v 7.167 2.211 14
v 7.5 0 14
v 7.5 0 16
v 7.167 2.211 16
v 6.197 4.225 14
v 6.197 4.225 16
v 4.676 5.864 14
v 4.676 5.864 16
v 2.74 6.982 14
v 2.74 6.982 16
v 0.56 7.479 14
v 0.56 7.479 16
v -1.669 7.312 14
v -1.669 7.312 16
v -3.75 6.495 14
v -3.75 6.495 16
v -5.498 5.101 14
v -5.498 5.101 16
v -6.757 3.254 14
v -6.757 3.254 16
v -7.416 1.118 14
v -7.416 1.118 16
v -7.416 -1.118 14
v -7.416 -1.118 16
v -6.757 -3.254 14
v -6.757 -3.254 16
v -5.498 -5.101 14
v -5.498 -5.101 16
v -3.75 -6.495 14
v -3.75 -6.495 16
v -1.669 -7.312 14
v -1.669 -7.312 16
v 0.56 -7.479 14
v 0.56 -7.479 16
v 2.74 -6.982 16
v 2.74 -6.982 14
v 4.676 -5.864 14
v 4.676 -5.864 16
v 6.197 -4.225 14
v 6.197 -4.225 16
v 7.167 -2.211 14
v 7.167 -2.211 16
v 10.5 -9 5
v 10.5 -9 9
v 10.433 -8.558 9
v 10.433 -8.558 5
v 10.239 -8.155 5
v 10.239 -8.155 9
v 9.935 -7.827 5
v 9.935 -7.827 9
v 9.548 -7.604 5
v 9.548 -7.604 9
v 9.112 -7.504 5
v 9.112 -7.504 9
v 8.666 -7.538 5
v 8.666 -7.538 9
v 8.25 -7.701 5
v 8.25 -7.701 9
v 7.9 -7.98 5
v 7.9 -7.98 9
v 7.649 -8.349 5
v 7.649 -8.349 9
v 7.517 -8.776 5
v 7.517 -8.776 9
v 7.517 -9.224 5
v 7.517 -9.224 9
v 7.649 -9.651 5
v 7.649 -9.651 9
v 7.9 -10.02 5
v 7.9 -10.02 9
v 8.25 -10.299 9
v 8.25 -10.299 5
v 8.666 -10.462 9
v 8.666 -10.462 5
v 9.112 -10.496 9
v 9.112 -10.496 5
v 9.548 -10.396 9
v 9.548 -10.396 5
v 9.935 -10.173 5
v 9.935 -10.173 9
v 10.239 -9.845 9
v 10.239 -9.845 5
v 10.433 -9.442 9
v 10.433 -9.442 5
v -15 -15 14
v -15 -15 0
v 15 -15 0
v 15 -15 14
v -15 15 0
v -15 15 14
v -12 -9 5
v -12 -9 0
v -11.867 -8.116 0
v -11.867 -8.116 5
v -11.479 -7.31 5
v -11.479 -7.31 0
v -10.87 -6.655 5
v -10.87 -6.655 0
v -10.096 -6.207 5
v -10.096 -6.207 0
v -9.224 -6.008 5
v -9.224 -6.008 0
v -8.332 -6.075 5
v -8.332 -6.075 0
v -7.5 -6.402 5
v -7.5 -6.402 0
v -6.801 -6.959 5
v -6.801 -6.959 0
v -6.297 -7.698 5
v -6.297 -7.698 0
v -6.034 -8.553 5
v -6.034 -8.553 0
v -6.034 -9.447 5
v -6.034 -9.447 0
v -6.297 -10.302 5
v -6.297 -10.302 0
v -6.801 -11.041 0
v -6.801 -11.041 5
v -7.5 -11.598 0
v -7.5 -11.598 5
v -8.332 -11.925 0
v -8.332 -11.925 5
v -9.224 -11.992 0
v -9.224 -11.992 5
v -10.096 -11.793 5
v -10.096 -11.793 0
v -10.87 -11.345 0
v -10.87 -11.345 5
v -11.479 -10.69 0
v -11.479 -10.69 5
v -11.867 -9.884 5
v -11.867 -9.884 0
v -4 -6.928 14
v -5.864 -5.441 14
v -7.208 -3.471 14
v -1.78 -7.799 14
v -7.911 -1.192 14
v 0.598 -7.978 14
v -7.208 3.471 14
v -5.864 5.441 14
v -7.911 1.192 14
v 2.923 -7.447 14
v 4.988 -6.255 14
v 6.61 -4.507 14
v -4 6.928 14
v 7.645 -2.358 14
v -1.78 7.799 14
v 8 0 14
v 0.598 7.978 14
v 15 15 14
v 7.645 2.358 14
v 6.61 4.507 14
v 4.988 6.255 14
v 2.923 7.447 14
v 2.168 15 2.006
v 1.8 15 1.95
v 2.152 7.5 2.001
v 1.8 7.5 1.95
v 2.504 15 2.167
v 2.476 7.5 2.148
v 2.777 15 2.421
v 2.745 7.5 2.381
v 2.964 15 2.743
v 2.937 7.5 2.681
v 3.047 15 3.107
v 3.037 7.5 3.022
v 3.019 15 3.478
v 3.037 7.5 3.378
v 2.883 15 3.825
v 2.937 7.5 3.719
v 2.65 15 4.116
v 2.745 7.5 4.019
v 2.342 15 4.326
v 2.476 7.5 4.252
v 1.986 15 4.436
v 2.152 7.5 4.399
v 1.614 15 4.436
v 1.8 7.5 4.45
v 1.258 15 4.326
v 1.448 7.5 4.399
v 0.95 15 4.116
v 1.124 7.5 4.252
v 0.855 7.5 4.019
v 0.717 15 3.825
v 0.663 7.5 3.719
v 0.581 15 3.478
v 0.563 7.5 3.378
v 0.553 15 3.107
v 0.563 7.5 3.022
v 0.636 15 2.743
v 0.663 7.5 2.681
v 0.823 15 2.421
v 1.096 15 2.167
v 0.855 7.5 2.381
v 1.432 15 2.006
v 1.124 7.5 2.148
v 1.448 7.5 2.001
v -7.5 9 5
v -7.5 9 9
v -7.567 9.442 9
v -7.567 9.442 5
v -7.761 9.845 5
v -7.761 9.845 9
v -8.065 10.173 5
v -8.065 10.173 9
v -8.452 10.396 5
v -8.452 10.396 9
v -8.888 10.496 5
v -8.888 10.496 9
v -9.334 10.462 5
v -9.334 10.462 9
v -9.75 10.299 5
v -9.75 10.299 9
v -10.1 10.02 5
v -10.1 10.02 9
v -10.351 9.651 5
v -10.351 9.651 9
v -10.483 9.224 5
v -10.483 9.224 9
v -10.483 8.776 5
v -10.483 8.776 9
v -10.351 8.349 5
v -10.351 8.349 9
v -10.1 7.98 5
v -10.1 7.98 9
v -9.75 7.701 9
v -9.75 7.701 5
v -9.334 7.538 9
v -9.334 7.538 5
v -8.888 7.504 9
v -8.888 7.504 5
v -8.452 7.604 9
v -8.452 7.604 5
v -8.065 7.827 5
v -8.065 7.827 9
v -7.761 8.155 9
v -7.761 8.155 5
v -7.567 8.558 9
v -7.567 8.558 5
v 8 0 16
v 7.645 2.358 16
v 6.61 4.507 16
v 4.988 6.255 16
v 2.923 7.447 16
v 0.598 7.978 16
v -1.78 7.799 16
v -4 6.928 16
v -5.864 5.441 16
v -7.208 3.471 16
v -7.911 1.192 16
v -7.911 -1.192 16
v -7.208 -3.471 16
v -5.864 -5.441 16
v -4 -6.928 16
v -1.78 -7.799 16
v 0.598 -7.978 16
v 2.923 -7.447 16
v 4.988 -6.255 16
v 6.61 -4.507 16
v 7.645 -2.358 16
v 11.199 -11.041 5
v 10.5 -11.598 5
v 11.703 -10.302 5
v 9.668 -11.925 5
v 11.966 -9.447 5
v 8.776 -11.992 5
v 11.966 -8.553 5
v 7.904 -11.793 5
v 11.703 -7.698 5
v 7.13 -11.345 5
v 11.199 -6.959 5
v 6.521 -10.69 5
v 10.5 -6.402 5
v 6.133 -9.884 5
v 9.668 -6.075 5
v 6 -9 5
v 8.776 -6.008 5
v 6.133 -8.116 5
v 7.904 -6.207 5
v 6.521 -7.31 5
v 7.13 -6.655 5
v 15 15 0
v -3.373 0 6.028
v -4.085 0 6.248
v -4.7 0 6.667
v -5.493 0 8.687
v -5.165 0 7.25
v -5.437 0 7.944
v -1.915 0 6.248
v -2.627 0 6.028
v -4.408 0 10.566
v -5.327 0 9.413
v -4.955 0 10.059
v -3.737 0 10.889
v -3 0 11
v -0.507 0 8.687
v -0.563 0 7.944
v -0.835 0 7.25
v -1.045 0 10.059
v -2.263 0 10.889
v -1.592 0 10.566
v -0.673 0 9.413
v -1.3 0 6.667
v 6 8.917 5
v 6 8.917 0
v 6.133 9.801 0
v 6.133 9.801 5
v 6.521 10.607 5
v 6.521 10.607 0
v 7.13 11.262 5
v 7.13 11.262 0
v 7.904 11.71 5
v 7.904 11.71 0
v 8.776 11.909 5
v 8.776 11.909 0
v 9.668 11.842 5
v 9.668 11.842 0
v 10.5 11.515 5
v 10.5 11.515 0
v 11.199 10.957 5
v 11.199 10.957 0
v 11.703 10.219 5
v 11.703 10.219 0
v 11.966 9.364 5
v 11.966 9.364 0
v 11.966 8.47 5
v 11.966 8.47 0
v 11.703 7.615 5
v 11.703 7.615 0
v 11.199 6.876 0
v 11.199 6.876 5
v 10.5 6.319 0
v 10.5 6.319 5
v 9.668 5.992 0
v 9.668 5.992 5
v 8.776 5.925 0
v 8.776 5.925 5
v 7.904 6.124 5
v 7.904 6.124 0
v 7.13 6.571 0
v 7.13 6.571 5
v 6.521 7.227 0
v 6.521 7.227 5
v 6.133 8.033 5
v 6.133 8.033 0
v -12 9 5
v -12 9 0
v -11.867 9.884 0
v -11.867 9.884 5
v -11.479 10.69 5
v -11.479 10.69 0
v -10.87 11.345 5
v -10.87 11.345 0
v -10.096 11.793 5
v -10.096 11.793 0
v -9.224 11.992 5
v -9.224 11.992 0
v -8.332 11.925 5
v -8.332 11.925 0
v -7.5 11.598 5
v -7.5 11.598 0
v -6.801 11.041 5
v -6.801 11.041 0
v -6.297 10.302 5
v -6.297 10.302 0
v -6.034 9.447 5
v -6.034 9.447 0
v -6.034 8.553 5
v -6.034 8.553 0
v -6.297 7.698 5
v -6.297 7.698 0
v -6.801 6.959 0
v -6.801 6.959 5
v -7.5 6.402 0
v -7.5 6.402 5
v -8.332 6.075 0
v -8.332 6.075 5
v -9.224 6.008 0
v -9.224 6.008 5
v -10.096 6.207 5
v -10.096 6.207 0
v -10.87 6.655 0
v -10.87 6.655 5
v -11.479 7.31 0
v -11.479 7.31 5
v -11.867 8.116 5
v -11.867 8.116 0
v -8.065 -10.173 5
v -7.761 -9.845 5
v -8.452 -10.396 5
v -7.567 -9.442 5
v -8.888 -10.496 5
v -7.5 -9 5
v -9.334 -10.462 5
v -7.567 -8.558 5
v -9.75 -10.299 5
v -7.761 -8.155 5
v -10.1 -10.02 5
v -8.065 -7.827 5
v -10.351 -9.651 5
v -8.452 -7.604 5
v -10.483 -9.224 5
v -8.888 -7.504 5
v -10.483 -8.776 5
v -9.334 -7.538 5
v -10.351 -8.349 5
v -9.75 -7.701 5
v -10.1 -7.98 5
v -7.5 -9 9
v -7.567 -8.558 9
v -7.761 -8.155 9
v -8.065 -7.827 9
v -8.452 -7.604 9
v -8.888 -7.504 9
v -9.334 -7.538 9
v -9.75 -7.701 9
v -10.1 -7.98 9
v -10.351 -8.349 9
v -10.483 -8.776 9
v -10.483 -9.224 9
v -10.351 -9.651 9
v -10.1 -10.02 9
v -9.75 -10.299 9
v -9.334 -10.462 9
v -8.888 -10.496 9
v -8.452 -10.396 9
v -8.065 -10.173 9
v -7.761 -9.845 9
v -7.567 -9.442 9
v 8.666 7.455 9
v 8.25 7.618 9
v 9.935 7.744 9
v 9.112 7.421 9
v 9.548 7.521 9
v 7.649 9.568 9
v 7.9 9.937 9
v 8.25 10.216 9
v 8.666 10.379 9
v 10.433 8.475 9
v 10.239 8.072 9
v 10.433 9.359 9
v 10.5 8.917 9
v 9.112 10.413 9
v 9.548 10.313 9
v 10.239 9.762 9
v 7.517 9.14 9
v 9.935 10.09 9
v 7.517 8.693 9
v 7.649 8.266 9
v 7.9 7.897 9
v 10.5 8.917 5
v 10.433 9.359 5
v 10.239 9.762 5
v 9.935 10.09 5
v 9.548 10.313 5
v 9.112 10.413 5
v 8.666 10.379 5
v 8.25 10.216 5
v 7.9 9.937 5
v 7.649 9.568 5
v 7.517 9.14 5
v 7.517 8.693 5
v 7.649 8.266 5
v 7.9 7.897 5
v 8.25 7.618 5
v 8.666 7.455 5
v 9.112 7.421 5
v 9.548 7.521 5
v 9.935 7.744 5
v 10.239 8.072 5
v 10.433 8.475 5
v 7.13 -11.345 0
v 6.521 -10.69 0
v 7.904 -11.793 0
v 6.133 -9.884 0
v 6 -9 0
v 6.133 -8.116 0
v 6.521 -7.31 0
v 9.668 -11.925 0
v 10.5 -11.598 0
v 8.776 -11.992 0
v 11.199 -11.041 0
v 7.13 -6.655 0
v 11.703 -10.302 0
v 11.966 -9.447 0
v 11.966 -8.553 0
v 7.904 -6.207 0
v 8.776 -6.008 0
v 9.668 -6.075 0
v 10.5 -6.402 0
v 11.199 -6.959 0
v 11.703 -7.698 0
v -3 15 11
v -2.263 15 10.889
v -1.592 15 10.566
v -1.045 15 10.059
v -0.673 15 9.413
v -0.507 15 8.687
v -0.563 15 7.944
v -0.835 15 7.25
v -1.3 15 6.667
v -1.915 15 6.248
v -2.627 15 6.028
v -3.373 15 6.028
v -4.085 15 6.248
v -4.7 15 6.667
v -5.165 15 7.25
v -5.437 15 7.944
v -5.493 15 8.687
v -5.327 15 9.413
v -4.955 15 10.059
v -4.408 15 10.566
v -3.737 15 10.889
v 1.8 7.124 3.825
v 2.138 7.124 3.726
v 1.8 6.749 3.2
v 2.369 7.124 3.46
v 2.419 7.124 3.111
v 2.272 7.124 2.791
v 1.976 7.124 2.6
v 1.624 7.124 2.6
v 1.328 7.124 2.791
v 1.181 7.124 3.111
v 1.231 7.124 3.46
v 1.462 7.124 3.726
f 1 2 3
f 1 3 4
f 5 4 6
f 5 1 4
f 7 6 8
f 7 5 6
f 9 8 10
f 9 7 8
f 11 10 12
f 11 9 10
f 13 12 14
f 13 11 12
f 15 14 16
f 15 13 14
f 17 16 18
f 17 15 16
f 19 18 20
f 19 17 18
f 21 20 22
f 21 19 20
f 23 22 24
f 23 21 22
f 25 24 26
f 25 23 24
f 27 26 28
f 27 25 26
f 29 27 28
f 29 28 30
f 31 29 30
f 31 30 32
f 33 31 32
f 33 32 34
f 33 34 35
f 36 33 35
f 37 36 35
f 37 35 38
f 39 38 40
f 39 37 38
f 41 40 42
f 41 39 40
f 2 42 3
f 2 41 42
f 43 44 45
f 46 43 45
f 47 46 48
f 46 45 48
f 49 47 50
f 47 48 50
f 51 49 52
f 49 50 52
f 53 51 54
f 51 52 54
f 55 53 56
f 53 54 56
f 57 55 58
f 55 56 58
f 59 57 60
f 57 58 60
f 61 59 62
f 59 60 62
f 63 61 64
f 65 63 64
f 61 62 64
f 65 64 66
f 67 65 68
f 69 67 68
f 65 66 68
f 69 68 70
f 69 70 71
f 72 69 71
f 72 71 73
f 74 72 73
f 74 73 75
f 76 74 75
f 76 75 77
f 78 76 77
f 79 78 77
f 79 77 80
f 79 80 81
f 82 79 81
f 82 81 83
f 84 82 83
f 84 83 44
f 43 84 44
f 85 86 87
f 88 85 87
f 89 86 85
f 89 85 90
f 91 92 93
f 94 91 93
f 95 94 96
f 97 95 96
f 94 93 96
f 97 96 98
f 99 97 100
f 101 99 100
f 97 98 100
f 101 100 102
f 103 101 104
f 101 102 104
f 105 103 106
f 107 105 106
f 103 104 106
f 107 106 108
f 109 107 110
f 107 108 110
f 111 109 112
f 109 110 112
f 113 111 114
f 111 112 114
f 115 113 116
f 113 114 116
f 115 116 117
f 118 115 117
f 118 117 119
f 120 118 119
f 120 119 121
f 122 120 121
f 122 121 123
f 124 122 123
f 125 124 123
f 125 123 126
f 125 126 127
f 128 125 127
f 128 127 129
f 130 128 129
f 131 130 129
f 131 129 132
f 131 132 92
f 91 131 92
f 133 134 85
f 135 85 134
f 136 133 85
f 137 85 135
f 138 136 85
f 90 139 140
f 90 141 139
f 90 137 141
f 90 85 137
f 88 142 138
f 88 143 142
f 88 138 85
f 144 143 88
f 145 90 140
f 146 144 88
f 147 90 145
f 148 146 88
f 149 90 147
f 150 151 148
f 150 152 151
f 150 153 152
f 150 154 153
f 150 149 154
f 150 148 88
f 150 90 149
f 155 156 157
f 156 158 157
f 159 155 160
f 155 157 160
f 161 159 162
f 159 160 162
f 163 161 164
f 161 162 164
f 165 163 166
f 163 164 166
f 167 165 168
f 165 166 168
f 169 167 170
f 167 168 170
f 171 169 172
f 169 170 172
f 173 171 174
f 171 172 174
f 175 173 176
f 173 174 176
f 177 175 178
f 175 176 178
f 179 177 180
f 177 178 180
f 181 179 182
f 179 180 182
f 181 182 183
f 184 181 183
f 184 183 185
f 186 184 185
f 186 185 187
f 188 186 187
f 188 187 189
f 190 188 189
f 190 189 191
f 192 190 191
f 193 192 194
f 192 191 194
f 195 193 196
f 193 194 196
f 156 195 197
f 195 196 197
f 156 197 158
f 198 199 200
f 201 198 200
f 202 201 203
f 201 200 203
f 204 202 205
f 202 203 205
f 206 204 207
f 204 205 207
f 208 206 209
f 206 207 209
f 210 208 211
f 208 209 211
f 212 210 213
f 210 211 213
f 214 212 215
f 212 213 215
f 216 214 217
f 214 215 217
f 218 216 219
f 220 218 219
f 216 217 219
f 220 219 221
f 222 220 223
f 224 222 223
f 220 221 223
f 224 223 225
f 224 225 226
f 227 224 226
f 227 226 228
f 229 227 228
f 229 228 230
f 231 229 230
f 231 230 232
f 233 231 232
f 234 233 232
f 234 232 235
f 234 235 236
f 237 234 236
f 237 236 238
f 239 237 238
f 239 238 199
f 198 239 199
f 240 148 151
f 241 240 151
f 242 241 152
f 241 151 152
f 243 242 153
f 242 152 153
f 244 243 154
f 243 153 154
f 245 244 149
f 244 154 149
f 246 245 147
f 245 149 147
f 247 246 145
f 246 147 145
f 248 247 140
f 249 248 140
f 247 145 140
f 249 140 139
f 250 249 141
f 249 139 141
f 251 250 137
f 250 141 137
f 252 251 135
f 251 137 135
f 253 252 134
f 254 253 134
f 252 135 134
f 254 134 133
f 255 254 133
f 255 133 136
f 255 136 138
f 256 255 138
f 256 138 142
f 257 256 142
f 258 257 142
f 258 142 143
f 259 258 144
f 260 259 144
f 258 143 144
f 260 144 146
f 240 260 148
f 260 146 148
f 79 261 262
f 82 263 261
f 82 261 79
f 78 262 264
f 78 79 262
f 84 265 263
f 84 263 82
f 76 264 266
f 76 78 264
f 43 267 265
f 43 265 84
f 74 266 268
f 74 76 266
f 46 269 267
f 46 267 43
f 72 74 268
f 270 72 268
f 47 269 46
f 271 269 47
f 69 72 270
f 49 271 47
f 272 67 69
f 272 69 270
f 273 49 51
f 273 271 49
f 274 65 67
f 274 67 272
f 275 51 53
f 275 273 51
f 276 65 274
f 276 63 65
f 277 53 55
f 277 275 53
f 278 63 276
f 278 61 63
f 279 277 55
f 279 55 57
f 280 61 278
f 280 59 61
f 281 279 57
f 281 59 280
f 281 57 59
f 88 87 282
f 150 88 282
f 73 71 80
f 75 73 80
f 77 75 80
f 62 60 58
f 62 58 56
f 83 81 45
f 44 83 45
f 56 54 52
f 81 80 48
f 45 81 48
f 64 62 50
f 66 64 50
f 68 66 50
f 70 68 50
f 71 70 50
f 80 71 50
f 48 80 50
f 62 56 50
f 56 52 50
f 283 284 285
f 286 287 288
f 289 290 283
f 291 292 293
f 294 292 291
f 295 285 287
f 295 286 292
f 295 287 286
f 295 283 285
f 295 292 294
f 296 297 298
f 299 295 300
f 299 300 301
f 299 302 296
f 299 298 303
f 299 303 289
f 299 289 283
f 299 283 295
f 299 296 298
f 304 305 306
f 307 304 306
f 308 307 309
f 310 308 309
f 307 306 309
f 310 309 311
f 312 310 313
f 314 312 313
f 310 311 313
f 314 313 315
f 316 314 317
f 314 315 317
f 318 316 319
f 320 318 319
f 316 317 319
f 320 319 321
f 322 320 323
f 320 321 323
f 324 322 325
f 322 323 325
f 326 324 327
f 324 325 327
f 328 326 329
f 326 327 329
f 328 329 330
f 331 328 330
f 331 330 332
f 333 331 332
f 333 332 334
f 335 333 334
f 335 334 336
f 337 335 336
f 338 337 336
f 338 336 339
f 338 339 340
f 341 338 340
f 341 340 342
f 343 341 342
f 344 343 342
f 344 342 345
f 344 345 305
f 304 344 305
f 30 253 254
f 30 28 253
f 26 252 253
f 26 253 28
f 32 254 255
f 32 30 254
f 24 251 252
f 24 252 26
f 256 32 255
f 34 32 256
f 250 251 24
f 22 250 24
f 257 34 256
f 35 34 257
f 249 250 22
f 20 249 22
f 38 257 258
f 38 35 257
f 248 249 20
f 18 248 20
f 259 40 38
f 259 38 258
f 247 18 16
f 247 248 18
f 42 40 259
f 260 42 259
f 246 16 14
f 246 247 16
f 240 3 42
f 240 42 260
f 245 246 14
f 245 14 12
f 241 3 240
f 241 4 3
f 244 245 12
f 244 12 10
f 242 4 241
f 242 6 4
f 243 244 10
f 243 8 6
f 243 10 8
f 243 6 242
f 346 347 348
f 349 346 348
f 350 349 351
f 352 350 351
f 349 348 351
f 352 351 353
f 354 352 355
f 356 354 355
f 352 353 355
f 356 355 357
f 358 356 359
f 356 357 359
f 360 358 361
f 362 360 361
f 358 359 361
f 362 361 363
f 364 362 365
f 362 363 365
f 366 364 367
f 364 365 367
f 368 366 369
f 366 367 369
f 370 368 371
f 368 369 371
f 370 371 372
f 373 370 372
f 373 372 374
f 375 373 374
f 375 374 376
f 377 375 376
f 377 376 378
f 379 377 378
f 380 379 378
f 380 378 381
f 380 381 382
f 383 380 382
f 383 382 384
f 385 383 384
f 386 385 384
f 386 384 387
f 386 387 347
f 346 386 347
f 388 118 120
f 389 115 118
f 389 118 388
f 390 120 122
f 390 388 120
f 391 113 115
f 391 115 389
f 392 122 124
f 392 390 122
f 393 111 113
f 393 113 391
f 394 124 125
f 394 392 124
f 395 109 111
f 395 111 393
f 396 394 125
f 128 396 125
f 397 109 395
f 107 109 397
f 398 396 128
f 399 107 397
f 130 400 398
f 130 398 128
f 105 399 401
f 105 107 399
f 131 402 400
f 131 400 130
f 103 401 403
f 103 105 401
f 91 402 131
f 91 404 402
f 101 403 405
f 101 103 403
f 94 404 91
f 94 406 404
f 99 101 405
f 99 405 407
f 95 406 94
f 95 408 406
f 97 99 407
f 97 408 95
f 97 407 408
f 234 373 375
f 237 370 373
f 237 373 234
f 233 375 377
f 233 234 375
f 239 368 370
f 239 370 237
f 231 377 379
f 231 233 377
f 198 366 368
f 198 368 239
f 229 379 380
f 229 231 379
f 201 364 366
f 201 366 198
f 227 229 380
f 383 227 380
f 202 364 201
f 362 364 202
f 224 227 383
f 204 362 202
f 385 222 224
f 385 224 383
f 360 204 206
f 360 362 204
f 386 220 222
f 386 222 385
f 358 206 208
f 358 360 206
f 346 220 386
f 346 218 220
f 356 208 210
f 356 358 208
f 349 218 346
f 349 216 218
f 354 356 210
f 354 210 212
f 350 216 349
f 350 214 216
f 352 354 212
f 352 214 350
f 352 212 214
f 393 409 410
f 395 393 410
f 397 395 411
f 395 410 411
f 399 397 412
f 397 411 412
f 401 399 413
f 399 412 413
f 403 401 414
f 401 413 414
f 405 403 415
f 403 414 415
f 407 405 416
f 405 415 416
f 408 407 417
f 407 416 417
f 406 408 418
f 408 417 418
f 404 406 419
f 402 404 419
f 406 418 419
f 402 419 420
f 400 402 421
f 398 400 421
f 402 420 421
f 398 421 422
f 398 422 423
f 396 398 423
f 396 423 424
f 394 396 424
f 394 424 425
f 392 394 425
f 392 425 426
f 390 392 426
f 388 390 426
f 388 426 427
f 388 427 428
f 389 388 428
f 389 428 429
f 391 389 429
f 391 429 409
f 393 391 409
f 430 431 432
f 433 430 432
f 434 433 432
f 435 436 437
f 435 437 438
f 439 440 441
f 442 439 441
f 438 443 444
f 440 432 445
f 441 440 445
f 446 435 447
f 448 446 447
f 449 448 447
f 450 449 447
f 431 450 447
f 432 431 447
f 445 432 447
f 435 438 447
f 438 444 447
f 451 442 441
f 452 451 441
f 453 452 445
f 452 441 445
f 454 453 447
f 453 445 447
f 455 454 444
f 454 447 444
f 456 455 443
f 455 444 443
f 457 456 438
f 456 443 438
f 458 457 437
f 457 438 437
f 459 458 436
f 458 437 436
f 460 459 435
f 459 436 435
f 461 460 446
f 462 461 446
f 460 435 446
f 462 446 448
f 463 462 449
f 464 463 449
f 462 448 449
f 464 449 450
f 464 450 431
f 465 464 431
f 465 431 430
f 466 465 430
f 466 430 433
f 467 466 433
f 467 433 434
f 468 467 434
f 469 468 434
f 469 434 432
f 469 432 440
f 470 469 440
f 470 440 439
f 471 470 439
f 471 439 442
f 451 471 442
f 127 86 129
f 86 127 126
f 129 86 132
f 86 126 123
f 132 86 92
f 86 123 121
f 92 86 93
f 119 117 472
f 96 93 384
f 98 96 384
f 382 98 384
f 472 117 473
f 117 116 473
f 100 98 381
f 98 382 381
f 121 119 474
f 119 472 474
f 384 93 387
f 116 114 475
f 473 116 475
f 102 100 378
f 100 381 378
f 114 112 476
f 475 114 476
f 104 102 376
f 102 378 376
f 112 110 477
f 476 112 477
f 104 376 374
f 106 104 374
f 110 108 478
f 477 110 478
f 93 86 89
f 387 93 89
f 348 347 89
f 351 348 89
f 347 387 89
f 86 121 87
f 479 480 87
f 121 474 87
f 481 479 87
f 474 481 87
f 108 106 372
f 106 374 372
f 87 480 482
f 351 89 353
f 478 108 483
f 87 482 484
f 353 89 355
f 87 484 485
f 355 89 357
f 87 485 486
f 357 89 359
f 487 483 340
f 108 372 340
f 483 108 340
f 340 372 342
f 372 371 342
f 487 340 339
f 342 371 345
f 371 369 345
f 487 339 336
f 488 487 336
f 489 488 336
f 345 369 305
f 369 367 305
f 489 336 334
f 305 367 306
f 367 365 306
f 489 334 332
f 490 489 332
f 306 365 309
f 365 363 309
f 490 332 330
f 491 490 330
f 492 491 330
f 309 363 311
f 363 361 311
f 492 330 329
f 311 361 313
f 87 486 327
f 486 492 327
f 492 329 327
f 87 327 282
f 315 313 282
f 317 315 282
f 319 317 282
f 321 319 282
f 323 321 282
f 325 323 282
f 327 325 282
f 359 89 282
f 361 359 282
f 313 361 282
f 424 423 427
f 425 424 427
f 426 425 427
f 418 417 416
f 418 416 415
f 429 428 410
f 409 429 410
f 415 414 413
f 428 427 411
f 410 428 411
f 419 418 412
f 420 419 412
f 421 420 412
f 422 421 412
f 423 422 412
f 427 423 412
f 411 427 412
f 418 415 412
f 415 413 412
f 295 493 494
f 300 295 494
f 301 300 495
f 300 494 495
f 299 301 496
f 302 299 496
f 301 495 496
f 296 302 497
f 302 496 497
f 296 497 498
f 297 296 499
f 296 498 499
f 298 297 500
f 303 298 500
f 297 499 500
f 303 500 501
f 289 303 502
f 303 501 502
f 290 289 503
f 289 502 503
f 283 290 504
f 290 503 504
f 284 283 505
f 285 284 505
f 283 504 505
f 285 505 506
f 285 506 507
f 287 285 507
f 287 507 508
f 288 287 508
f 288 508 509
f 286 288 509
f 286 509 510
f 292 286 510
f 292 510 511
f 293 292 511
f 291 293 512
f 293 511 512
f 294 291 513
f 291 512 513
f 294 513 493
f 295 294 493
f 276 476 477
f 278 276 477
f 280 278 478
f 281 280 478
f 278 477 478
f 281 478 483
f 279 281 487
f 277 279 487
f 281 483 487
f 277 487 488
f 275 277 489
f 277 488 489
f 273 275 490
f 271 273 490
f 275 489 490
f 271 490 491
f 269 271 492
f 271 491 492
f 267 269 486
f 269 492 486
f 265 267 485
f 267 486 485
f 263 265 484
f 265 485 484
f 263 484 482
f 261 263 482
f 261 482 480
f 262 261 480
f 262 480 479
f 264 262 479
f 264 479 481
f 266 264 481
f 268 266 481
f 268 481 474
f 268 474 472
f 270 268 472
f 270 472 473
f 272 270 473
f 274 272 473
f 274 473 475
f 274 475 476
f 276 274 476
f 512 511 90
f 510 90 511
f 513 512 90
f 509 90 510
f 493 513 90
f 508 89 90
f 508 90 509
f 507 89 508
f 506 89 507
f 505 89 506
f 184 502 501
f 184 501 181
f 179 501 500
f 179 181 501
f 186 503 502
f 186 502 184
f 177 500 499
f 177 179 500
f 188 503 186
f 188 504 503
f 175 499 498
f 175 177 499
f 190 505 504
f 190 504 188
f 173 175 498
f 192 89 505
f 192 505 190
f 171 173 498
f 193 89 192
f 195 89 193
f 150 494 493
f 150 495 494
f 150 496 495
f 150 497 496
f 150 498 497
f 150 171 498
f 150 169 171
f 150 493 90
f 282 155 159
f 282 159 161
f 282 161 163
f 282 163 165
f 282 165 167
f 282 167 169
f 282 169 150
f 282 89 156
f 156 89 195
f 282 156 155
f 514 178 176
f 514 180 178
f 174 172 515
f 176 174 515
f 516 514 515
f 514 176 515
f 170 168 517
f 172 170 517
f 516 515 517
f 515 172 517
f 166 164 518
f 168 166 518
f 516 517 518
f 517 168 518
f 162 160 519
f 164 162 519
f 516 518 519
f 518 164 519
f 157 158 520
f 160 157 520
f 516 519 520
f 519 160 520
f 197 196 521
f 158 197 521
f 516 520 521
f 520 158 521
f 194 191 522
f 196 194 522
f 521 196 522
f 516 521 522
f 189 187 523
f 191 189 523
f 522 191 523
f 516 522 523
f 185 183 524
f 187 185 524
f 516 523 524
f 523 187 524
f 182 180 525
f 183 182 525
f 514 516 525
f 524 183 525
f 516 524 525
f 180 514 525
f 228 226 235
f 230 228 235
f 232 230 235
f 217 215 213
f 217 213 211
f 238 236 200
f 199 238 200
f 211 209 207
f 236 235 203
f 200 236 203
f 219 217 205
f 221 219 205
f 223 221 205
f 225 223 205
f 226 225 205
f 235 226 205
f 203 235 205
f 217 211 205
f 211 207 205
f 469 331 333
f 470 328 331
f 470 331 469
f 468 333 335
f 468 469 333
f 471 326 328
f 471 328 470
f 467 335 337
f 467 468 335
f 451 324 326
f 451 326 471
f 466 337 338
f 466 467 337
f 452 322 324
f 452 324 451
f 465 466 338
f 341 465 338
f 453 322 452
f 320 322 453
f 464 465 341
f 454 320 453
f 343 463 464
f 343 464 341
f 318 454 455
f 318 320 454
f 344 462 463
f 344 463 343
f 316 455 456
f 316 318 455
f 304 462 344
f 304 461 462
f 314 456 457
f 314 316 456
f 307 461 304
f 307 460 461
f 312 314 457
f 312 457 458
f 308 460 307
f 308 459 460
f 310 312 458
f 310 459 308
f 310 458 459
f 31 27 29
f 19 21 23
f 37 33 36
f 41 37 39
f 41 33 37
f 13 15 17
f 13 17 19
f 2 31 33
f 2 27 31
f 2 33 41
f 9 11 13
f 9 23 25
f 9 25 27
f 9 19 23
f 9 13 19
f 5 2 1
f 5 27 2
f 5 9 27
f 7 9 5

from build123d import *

# Parameters (mm, degrees)
SKETCH_1_W                = 30
SKETCH_1_H                = 30
EXTRUDE_1_DEPTH           = 14
SKETCH_2_R                = 8
SKETCH_2_R_2              = 7.5
EXTRUDE_2_DEPTH           = 2
SKETCH_3_R                = 2.5
CUT_EXTRUDE_1_DEPTH       = 15
HOLE_WIZARD_M3_1_D        = 2.5
HOLE_WIZARD_M3_1_DEPTH    = 7.5
HOLE_WIZARD_M3_1_TIP      = 0.751075774
HOLE_WIZARD_1_D           = 3
HOLE_WIZARD_1_DEPTH       = 9
HOLE_WIZARD_1_CBORE_D     = 6
HOLE_WIZARD_1_CBORE_DEPTH = 5


with BuildPart() as part:
    # 草图1 → 凸台-拉伸1 (new body)
    with BuildSketch(Plane.XY):
        Rectangle(SKETCH_1_W, SKETCH_1_H)
    extrude(amount=EXTRUDE_1_DEPTH)

    # 草图2 → 凸台-拉伸2 (add)
    with BuildSketch(Plane.XY.offset(14)):
        Circle(SKETCH_2_R)
        Circle(SKETCH_2_R_2, mode=Mode.SUBTRACT)
    extrude(amount=EXTRUDE_2_DEPTH)

    # 草图3 → 切除-拉伸1 (cut)
    with BuildSketch(Plane(origin=(0, 15, 0), x_dir=(1, 0, 0), z_dir=(0, 1, 0))):
        with Locations(Location((-3, -8.5, 0), (0, 0, 270))):
            Circle(SKETCH_3_R)
    extrude(amount=-CUT_EXTRUDE_1_DEPTH, mode=Mode.SUBTRACT)

    # M3 螺纹孔1
    with Locations(Plane(origin=(1.8, 15, 3.2), x_dir=(0, 0, 1), z_dir=(0, 1, 0))):
        with Locations((0, 0)):
            Hole(HOLE_WIZARD_M3_1_D / 2, depth=HOLE_WIZARD_M3_1_DEPTH)
            with Locations((0, 0, -(HOLE_WIZARD_M3_1_DEPTH + HOLE_WIZARD_M3_1_TIP / 2))):  # 118° drill point
                Cone(0, HOLE_WIZARD_M3_1_D / 2, HOLE_WIZARD_M3_1_TIP, mode=Mode.SUBTRACT)

    # 孔1
    with Locations(Plane(origin=(9, 8.916915074, 0), x_dir=(-1, 0, 0), z_dir=(0, 0, -1))):
        with Locations((0, 0), (18, 0.083084926), (18, -17.916915074), (0, -17.916915074)):
            CounterBoreHole(HOLE_WIZARD_1_D / 2, HOLE_WIZARD_1_CBORE_D / 2, HOLE_WIZARD_1_CBORE_DEPTH, depth=HOLE_WIZARD_1_DEPTH)


solid = part.part
